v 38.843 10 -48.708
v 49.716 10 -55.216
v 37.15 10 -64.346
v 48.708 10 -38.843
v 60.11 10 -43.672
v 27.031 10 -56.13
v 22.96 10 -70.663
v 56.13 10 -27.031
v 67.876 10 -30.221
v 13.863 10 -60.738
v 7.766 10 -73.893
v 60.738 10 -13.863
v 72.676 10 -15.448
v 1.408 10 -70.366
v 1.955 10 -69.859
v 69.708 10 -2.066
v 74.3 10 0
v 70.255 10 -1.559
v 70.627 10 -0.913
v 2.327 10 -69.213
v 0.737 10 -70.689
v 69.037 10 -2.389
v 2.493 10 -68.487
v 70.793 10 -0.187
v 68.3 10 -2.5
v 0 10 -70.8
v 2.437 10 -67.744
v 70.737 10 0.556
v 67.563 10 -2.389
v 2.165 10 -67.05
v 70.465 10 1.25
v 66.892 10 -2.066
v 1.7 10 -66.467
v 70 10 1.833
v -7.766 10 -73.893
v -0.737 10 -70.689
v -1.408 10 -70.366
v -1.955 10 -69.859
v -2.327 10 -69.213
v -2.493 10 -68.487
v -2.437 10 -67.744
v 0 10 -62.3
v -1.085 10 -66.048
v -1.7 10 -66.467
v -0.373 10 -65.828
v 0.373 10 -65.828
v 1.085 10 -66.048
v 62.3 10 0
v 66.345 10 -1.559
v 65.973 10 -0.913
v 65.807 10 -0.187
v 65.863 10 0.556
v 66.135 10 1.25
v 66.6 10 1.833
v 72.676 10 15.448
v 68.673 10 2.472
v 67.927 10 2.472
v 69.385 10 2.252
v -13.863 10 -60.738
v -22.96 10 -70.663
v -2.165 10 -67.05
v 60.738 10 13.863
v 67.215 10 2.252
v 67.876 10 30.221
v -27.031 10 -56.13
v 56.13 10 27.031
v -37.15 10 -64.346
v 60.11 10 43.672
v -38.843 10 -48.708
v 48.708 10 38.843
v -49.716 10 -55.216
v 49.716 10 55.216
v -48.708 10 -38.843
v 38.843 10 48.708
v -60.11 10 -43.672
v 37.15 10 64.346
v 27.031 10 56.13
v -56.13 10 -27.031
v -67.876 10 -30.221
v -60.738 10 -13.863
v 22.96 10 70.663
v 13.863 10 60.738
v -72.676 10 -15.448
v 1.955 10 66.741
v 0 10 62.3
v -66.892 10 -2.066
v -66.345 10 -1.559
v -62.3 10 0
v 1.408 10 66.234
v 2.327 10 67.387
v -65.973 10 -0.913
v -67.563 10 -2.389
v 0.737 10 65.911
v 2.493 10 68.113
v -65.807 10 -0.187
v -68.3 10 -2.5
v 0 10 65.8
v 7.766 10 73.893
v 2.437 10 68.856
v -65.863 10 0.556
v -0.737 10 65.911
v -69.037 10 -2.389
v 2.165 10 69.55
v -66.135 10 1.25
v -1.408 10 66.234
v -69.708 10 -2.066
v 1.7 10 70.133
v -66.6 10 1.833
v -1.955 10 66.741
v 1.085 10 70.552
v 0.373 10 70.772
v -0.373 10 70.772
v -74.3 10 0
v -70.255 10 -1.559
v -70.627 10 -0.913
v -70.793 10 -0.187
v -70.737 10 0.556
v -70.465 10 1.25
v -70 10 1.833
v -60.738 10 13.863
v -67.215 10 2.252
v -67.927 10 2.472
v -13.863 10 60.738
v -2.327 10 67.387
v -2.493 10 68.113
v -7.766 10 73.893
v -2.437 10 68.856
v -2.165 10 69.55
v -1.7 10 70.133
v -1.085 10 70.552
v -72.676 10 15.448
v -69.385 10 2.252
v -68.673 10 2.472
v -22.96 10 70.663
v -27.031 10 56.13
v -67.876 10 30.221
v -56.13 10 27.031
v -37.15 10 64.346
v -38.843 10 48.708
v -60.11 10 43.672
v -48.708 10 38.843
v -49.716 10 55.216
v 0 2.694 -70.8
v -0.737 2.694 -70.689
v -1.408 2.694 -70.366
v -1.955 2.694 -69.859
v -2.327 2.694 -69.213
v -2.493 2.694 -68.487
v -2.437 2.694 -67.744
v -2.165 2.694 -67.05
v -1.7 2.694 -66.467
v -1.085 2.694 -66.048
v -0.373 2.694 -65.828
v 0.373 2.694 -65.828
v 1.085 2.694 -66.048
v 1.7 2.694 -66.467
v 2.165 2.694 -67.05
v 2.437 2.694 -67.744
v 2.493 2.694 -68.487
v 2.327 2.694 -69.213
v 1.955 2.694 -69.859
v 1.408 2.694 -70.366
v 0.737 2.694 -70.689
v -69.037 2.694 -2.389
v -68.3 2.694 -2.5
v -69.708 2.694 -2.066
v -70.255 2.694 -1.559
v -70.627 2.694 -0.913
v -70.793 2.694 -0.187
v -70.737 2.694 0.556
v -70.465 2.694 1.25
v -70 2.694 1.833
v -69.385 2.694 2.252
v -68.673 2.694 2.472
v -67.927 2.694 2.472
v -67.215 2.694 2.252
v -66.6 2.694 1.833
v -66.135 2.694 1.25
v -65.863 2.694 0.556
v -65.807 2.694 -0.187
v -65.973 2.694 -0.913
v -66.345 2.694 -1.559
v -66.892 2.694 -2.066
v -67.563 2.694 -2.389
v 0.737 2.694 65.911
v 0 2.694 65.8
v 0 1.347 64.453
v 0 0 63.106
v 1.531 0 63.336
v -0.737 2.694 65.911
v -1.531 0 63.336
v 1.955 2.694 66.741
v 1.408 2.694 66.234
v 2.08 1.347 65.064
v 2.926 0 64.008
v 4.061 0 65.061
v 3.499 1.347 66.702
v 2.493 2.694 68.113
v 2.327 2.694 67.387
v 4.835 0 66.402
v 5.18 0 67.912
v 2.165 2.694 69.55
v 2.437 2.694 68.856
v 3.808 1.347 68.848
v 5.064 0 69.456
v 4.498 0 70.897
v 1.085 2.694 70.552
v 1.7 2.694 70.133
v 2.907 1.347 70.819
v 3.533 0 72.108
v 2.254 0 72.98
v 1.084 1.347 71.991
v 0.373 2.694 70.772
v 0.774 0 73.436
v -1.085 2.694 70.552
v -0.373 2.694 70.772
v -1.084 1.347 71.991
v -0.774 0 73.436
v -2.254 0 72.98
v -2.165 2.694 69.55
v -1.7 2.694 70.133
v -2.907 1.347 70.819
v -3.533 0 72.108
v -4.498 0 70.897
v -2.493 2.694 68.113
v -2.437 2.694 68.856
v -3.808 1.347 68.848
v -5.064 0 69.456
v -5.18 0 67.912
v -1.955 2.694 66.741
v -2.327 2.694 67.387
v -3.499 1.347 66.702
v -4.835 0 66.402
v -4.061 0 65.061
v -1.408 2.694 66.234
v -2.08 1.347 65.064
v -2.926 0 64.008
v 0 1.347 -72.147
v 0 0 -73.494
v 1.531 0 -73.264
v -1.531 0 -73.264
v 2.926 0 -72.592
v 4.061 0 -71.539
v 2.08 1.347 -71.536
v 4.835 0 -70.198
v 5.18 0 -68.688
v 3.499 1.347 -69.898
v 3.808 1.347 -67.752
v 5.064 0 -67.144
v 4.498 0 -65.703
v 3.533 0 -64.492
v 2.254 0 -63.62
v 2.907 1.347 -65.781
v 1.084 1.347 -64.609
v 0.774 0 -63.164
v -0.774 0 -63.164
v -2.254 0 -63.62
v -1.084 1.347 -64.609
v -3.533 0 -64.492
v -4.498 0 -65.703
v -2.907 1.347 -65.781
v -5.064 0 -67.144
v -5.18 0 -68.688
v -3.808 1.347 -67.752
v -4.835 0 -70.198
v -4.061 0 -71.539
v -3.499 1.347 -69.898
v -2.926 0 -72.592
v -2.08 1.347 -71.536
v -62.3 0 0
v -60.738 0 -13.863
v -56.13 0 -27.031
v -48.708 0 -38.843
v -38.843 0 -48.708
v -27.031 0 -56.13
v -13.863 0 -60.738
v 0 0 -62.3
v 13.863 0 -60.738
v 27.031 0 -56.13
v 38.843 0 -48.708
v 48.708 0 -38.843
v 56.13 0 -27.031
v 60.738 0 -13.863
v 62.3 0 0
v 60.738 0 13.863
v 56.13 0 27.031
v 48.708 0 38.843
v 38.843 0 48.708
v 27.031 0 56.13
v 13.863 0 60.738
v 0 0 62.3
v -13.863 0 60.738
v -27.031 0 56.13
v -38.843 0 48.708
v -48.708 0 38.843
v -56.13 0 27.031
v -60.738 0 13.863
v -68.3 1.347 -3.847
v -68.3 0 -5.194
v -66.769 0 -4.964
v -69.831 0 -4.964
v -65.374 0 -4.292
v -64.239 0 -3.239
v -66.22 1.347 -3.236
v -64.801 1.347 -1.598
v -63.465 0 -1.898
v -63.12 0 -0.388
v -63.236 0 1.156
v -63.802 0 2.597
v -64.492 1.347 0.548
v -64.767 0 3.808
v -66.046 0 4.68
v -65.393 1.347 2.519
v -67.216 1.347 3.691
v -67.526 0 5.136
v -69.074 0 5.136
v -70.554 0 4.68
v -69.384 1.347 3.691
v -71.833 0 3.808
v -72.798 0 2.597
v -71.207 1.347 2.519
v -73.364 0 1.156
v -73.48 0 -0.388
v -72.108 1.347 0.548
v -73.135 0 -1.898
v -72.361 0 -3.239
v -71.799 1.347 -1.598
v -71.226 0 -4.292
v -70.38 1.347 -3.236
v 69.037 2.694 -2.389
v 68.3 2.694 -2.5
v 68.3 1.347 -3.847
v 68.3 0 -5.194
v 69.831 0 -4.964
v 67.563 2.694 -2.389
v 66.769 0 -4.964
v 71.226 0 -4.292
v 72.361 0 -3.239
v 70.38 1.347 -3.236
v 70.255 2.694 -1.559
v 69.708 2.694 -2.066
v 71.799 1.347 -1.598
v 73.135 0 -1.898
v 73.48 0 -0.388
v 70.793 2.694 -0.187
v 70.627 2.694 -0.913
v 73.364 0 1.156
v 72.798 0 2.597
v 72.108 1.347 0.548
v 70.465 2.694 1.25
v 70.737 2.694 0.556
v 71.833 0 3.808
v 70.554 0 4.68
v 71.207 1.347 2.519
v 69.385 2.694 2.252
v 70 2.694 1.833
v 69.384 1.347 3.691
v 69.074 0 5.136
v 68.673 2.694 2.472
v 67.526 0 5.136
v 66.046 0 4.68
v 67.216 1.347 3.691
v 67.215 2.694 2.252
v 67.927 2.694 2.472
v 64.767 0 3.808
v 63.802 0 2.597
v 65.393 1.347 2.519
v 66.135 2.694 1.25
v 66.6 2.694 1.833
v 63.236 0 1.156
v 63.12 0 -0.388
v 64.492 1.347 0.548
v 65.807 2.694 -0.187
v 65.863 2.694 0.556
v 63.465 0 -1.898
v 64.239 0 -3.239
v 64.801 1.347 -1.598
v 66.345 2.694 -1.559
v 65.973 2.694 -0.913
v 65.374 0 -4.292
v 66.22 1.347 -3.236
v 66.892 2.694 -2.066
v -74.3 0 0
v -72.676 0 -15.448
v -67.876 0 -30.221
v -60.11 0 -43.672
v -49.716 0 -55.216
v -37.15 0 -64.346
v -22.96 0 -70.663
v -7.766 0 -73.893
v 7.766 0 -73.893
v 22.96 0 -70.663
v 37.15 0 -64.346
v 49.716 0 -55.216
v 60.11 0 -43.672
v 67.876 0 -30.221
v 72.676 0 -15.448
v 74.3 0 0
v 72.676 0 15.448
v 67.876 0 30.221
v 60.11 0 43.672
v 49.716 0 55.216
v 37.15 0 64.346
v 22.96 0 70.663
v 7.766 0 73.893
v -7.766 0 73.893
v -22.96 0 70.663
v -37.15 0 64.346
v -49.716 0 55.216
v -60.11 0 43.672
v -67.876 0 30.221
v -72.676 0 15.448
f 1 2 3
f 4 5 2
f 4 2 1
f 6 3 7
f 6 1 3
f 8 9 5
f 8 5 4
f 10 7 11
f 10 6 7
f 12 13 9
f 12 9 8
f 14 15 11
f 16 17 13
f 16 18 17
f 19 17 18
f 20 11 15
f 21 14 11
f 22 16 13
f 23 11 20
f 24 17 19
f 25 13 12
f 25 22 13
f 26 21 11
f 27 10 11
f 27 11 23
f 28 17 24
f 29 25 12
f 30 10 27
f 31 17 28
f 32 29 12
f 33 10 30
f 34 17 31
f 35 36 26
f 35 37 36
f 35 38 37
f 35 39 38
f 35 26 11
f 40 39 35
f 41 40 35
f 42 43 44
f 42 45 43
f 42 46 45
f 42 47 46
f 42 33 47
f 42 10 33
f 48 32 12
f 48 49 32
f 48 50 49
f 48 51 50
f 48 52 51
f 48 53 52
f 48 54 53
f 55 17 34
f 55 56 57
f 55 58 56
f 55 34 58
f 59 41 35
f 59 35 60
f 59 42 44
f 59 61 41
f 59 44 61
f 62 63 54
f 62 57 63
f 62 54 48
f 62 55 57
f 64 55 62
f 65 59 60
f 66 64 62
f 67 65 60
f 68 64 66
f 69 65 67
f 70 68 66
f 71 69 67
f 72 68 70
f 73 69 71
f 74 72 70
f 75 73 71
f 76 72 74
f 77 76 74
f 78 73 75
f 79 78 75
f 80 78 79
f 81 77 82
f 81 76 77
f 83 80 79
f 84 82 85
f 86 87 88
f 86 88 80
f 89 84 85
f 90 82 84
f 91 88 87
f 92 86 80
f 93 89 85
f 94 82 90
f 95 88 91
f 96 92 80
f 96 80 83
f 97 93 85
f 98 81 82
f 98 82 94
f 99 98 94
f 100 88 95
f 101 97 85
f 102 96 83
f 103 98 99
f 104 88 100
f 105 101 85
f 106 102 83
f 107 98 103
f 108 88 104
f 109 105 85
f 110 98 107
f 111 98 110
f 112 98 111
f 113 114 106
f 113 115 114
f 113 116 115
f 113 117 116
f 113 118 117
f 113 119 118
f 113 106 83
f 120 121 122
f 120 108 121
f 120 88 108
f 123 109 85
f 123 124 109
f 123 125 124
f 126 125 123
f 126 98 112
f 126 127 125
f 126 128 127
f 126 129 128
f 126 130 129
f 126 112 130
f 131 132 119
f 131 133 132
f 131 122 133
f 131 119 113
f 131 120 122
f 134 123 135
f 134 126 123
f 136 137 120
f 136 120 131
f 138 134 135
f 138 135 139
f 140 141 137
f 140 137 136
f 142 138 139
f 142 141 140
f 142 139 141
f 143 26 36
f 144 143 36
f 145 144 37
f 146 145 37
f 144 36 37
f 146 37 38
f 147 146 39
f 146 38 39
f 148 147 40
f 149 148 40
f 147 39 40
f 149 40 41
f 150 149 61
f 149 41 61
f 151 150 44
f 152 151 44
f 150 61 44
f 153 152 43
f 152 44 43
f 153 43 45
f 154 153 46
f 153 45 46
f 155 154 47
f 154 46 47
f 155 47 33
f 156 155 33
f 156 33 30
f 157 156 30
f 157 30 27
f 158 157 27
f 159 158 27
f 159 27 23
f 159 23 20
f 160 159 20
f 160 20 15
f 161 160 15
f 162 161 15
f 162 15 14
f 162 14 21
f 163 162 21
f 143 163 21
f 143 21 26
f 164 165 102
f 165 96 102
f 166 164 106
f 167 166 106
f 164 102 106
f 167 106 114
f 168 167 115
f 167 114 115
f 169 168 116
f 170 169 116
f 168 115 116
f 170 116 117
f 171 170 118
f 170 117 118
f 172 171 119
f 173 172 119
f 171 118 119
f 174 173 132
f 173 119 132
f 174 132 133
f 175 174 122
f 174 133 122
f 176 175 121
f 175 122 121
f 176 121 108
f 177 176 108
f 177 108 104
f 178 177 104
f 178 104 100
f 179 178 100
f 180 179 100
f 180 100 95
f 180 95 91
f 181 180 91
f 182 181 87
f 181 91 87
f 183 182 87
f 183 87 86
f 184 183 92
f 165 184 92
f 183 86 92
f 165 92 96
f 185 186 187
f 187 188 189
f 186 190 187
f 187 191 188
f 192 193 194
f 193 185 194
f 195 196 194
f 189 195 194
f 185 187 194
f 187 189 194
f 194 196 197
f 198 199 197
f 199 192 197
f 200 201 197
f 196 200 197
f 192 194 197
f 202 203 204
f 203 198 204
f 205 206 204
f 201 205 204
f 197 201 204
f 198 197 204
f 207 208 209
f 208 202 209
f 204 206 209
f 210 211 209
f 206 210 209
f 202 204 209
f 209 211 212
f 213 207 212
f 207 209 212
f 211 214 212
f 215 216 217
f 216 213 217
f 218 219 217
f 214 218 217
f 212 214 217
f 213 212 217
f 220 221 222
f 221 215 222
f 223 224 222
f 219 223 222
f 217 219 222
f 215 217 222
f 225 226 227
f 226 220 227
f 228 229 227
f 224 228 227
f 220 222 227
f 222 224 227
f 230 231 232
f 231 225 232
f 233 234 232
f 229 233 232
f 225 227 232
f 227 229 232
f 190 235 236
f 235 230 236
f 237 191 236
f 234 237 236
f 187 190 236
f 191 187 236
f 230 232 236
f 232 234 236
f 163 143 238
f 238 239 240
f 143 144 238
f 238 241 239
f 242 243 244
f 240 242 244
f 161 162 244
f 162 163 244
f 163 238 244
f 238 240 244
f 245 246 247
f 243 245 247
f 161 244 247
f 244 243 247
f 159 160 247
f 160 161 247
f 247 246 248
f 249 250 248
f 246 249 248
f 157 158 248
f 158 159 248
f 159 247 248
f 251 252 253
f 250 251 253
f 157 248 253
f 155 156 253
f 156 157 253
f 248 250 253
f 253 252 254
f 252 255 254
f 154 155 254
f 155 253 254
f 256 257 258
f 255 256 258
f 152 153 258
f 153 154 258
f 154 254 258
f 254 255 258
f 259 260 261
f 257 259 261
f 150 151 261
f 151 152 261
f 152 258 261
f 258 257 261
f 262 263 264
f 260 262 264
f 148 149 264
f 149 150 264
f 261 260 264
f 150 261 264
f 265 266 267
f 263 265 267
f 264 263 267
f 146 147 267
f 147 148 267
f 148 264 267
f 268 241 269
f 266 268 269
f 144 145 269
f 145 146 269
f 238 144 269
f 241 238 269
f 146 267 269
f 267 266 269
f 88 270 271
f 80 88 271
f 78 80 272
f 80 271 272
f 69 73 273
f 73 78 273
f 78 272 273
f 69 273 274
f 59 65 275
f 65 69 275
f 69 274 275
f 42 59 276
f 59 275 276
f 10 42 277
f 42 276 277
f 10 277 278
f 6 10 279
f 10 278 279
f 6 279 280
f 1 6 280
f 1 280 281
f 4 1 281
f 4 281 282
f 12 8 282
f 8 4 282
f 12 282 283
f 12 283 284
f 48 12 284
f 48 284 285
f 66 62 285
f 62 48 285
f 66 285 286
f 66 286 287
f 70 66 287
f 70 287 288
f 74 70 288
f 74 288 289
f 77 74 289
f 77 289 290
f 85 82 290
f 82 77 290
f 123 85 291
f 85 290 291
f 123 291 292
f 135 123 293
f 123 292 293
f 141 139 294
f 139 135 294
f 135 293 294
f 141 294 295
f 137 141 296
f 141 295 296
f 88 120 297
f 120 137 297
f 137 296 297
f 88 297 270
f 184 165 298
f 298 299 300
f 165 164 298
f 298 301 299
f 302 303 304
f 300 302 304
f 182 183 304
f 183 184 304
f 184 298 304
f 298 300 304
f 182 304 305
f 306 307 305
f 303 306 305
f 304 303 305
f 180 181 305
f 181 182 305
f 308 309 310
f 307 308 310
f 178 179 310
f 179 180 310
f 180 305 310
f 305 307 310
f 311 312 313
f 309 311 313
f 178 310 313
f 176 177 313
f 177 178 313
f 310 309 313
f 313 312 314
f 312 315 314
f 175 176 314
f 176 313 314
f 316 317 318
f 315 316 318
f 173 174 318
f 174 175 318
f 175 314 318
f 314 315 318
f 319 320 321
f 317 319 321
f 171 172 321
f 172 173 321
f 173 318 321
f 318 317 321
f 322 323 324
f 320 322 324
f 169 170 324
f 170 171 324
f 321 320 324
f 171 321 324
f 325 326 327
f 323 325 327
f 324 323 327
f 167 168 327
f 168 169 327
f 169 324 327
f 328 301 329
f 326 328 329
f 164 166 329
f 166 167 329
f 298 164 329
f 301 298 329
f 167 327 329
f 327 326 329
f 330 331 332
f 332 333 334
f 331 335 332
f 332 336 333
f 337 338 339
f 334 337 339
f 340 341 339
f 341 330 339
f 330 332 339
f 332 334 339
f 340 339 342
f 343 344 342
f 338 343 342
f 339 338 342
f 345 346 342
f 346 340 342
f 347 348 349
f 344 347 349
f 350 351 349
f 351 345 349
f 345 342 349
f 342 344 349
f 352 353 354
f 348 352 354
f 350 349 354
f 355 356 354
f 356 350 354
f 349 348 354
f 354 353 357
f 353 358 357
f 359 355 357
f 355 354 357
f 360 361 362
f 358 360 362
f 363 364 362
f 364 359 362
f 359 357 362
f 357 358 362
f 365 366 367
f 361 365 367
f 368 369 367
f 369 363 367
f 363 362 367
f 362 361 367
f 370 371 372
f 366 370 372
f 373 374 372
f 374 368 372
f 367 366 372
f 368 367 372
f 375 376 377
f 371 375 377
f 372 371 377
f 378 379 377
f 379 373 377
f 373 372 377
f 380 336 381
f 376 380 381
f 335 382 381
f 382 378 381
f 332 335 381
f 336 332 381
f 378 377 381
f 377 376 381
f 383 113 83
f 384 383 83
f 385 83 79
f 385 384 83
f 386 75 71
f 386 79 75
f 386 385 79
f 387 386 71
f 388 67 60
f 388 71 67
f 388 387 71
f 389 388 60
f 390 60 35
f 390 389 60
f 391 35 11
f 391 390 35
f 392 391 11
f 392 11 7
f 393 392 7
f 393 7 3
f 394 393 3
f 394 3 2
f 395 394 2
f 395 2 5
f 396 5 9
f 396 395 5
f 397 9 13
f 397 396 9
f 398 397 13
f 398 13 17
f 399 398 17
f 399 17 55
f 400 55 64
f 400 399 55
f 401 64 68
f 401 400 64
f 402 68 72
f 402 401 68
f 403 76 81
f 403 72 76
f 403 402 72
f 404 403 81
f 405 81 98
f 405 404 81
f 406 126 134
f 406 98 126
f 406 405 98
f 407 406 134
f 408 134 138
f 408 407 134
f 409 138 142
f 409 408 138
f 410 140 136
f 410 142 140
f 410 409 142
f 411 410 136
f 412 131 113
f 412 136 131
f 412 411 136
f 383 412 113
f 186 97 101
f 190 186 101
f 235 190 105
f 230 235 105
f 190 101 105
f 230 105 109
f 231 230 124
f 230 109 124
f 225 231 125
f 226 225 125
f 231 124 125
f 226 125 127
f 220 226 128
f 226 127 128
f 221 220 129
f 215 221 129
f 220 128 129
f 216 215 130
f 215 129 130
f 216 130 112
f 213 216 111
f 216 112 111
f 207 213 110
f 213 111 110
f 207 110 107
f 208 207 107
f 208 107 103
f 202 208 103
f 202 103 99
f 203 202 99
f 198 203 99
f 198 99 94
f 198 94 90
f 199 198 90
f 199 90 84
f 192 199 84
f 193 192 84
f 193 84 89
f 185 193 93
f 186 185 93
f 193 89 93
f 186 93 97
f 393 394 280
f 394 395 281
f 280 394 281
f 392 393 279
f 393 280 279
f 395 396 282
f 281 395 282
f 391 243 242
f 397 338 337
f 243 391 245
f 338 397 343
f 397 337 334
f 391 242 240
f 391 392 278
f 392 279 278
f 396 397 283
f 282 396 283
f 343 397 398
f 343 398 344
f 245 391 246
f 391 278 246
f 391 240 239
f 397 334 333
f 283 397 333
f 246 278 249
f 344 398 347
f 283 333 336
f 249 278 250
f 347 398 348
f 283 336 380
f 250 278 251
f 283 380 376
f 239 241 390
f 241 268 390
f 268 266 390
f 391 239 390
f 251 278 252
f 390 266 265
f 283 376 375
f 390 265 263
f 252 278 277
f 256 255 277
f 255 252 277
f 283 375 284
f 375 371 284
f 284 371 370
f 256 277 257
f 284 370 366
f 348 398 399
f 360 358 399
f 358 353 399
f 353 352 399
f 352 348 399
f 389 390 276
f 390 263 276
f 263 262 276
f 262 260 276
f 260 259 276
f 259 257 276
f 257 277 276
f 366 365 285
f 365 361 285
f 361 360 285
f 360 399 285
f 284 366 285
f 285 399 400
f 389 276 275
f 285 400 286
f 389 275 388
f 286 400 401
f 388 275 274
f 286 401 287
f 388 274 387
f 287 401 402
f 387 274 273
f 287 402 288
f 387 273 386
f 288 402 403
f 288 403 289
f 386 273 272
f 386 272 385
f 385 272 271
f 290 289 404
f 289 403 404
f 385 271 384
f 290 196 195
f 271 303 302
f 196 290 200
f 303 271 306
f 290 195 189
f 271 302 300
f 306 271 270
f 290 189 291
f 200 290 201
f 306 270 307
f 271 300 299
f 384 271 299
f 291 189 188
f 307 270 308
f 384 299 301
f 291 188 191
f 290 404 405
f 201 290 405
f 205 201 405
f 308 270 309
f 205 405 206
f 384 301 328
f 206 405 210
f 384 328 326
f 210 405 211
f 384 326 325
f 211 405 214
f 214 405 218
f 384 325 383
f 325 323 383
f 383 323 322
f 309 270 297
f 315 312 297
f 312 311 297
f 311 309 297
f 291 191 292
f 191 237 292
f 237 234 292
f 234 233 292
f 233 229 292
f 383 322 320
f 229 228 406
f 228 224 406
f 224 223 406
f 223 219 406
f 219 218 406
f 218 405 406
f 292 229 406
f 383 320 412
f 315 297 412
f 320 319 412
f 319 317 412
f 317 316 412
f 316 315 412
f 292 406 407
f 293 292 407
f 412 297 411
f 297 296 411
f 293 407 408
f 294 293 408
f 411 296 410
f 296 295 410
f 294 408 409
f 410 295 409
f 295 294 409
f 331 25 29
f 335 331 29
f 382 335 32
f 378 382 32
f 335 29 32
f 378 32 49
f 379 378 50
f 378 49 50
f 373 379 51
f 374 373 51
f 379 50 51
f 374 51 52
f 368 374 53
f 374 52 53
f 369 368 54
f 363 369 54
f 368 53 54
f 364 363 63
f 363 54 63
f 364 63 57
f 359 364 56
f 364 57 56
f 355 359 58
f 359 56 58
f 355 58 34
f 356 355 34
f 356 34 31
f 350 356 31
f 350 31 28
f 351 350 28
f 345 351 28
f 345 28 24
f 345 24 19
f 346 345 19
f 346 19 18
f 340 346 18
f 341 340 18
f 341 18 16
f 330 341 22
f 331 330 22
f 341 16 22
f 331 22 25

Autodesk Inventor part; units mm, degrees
ref_plane "YZ Plane" through (0, 0, 0) normal (1, 0, 0) x (0, 1, 0)
ref_plane "XZ Plane" through (0, 0, 0) normal (0, 1, 0) x (-1, 0, 0)
ref_plane "XY Plane" through (0, 0, 0) normal (0, 0, 1) x (1, 0, 0)
sketch "Sketch1" plane through (0, 0, 0) normal (0, 1, 0) x (-1, 0, 0)
  circle A0 centre (0, 0) radius 74.3
  circle A1 centre (0, 0) radius 62.3
  line L0 (62.3, 0) -> (74.3, 0) construction
  point P0 (68.3, 0)
  point P1 (0, 68.3)
  point P2 (-68.3, 0)
  point P3 (0, -68.3)
  dimension "d0" = 148.6
  dimension "d1" = 12
  dimension "d4" = 360
extrude "Extrusion1" add sketch "Sketch1" along normal blind 10
hole "Hole1" at (-68.3, 0, 0) at (0, 0, 68.3) at (68.3, 0, 0) at (0, 0, -68.3) direction (0, 1, 0) diameter 5 end through all countersink diameter 10.3886 countersink angle 90 clearance for "Flat Head Machine Screw" size "M5" standard "Ansi Metric M Profile"
properties part number "OR"
